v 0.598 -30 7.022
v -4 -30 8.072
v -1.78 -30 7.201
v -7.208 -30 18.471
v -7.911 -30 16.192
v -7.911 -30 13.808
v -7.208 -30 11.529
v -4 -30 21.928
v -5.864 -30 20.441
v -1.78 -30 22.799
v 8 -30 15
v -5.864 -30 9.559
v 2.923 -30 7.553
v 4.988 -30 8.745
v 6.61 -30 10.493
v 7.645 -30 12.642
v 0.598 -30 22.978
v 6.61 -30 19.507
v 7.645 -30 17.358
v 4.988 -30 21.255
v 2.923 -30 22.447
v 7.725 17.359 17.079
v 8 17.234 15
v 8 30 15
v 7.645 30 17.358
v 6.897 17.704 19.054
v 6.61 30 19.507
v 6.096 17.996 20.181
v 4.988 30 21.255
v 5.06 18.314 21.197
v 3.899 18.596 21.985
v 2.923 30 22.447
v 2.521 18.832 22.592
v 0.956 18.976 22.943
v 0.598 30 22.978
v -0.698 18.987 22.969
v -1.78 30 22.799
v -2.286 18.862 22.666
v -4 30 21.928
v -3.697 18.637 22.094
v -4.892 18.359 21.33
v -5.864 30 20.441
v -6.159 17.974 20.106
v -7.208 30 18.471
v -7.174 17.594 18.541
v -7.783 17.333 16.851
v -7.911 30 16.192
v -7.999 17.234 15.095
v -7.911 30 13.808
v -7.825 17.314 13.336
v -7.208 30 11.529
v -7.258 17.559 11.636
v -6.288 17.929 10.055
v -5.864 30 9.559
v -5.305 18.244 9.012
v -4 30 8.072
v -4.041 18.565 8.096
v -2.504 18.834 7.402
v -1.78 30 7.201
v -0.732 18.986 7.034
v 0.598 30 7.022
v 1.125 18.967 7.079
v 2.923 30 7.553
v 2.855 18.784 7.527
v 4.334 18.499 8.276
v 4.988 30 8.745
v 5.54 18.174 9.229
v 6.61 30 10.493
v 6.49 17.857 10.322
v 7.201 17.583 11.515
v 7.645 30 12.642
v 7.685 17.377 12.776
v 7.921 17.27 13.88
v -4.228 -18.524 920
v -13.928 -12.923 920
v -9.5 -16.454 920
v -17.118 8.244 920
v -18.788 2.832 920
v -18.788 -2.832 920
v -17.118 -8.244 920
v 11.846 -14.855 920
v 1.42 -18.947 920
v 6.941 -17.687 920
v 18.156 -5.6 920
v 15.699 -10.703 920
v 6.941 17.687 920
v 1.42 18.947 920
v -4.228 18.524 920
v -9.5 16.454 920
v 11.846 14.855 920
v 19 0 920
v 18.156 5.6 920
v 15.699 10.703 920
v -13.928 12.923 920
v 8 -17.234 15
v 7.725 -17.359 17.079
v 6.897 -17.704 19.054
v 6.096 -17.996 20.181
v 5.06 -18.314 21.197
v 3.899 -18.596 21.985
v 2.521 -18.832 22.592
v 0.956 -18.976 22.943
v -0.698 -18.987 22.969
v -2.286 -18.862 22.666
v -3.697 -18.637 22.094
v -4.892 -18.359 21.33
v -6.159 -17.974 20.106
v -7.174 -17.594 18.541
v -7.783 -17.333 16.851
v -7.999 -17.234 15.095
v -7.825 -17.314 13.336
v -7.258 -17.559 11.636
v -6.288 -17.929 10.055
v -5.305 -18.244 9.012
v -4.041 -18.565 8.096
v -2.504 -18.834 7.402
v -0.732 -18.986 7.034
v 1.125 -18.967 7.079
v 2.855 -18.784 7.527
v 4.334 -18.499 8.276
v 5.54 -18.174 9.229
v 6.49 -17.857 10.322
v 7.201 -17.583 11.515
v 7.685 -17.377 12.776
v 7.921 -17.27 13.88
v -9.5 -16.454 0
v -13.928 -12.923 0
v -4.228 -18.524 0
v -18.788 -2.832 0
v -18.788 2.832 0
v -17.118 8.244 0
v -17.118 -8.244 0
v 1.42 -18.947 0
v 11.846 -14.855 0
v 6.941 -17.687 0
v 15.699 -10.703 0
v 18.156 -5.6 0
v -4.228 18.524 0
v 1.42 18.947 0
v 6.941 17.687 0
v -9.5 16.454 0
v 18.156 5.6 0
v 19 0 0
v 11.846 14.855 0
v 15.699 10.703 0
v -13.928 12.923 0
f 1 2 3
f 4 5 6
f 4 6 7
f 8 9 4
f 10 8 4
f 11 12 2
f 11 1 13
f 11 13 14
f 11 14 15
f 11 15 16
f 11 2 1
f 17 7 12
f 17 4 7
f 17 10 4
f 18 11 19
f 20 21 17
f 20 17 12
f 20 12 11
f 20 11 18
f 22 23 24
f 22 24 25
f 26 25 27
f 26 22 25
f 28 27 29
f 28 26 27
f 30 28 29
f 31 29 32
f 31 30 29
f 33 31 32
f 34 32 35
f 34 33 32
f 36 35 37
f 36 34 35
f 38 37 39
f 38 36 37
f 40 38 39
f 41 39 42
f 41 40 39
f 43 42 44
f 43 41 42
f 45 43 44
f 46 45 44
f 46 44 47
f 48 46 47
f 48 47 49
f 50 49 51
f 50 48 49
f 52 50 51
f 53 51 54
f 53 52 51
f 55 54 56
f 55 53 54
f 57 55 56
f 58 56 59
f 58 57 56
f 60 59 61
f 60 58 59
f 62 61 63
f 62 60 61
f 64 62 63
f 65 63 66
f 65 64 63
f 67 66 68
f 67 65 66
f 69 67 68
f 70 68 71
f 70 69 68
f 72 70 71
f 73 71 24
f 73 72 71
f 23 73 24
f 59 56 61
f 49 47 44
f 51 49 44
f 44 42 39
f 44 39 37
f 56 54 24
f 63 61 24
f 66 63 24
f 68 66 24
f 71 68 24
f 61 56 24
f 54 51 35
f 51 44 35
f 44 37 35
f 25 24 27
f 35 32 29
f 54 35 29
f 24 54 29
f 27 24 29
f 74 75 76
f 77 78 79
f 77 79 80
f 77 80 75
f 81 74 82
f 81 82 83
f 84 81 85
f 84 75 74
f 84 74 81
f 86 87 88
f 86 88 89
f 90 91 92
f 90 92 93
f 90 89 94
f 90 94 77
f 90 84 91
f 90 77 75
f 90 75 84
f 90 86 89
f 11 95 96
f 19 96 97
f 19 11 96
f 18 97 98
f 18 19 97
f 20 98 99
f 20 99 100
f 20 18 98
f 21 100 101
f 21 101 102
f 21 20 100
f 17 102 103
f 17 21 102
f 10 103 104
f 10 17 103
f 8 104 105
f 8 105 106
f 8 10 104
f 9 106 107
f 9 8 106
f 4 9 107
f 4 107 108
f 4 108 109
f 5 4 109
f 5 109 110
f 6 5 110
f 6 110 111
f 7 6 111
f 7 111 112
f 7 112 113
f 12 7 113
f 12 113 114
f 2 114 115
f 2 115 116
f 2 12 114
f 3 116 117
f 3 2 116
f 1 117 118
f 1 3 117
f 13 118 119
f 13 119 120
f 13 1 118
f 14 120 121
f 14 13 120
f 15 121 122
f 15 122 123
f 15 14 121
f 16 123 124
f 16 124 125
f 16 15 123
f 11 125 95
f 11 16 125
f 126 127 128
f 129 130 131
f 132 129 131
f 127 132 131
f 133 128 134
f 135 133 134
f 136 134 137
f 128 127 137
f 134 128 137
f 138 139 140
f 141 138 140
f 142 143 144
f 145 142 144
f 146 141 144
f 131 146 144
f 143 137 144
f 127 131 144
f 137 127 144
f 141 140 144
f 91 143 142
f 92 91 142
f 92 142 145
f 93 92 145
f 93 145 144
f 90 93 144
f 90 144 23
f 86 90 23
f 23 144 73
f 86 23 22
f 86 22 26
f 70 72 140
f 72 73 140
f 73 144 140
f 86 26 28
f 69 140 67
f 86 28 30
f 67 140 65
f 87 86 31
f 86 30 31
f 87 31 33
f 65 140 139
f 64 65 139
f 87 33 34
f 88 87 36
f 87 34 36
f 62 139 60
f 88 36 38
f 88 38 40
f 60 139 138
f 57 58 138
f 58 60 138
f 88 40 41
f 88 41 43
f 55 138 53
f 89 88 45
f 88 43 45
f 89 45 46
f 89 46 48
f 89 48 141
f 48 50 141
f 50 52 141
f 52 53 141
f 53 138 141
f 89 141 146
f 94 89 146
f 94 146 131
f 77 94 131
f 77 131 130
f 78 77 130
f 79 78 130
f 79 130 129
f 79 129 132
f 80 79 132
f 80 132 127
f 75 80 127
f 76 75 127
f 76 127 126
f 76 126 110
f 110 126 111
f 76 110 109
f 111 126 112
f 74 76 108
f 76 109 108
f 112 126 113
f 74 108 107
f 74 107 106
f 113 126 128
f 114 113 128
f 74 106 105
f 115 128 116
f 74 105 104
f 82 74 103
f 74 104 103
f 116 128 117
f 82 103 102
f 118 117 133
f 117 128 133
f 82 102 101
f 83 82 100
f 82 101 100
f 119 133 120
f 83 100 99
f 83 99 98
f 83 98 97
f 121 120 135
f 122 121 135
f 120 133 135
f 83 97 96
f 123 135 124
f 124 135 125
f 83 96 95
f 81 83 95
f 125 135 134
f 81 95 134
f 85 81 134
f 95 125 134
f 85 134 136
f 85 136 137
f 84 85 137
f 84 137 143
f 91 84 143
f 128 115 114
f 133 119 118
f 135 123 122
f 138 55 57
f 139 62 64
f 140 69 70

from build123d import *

# Parameters (mm, degrees)
F0_R     = 19
F1_DEPTH = 920
F2_R     = 8
F3_DEPTH = 30


with BuildPart() as f1:
    # F0 (on Top) → F1 (new body)
    with BuildSketch(Plane.XY):
        Circle(F0_R)
    extrude(amount=F1_DEPTH)

    # F2 (on Front) → F3 (join, symmetric)
    with BuildSketch(Plane.XZ):
        with Locations((0, 15)):
            Circle(F2_R)
    extrude(amount=F3_DEPTH, both=True)


solid = f1.part
